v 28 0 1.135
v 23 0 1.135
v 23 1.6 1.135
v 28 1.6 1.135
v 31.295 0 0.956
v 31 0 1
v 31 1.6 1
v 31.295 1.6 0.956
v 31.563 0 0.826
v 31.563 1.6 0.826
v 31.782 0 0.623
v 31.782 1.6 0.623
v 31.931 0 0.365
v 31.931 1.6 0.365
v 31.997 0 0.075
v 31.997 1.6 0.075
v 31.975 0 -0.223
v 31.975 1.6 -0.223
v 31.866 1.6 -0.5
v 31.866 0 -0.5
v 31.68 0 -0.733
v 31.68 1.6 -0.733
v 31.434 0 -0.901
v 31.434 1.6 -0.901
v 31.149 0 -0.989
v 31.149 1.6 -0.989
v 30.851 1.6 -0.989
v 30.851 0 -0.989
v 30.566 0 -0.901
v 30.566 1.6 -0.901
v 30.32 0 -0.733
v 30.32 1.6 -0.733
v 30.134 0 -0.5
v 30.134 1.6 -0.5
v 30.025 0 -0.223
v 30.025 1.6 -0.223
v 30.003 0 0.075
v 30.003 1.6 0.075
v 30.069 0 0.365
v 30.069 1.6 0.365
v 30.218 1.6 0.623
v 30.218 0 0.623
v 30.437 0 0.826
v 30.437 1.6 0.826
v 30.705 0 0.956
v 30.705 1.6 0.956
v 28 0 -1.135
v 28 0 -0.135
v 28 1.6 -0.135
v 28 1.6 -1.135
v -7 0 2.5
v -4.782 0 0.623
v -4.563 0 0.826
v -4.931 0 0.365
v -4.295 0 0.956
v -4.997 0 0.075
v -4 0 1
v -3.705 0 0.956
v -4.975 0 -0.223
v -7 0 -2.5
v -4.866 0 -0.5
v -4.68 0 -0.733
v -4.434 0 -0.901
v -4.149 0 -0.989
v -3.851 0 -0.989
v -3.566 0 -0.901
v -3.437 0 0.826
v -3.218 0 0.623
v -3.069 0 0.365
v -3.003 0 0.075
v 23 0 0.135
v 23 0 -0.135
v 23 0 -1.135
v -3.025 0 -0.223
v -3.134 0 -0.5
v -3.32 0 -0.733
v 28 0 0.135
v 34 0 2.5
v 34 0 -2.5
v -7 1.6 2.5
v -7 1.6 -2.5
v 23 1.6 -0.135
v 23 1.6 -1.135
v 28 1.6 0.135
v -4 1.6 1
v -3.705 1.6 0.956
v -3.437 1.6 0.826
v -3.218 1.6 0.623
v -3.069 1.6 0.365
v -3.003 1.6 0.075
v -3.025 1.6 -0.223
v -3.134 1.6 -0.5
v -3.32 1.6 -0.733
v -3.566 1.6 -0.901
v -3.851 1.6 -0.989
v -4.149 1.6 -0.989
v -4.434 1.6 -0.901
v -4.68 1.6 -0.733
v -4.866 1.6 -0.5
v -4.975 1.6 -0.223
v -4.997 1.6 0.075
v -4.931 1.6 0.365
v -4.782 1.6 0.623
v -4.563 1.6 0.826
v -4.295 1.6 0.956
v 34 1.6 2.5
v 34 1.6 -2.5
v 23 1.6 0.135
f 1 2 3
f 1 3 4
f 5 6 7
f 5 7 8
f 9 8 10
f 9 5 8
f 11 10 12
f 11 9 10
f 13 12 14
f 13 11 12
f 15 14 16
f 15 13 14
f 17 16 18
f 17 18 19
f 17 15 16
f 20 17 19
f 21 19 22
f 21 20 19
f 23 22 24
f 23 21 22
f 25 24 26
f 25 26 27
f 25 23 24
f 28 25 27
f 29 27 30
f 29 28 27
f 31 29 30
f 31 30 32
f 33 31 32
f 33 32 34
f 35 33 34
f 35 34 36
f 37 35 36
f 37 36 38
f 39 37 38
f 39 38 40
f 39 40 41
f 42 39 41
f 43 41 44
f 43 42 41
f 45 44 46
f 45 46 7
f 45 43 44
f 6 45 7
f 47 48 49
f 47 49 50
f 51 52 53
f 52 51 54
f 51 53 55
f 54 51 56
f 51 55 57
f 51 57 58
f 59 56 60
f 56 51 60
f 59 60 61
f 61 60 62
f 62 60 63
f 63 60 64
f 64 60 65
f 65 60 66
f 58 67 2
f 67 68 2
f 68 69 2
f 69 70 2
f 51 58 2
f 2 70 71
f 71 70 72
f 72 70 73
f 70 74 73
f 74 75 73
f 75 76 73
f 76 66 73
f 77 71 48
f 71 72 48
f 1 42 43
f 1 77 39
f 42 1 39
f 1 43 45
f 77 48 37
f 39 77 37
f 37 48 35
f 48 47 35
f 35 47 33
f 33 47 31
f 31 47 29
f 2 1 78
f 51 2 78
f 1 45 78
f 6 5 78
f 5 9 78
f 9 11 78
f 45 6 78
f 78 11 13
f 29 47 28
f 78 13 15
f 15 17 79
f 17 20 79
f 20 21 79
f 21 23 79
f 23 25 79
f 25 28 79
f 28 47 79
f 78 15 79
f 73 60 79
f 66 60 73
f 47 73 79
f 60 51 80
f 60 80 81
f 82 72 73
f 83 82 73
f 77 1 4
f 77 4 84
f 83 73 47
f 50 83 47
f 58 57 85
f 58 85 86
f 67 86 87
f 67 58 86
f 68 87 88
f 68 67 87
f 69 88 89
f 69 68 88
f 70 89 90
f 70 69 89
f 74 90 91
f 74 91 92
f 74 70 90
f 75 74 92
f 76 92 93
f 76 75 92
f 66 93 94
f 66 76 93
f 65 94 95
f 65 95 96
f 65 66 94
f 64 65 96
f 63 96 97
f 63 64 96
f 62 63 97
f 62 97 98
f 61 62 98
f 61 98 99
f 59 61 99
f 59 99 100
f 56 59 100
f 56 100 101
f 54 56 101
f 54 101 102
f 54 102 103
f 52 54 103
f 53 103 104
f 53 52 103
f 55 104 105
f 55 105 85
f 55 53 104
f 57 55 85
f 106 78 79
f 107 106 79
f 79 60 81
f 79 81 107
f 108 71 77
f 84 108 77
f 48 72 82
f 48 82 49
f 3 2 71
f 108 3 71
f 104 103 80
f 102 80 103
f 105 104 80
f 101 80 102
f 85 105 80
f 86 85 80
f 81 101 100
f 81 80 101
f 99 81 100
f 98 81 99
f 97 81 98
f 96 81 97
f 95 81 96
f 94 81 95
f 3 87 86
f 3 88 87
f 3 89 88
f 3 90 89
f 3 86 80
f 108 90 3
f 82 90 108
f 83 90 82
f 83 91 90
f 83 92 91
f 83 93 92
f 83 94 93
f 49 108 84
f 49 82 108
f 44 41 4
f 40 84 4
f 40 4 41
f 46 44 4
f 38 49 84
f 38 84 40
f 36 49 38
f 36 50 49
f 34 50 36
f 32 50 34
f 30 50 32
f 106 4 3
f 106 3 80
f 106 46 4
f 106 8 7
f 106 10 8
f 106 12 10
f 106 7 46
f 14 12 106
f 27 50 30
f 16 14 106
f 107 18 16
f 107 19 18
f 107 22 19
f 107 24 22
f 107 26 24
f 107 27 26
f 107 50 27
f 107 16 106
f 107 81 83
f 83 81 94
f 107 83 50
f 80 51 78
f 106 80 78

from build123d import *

# Parameters (mm, degrees)
SKETCH1_W           = 41
SKETCH1_H           = 5
SKETCH1_W_2         = 5
SKETCH1_H_2         = 1
SKETCH1_R           = 1
BOSS_EXTRUDE1_DEPTH = 1.6


with BuildPart() as part:
    # Sketch1 → Boss-Extrude1 (new body)
    with BuildSketch(Plane(origin=(0, 0, 0), x_dir=(1, 0, 0), z_dir=(0, 1, 0))):
        with Locations((13.5, 0)):
            Rectangle(SKETCH1_W, SKETCH1_H)
        with Locations((25.5, -0.635)):
            Rectangle(SKETCH1_W_2, SKETCH1_H_2, mode=Mode.SUBTRACT)
        with Locations(Location((-4, 0, 0), (0, 0, 270))):
            Circle(SKETCH1_R, mode=Mode.SUBTRACT)
        with Locations(Location((31, 0, 0), (0, 0, 270))):
            Circle(SKETCH1_R, mode=Mode.SUBTRACT)
        with Locations((25.5, 0.635)):
            Rectangle(SKETCH1_W_2, SKETCH1_H_2, mode=Mode.SUBTRACT)
    extrude(amount=BOSS_EXTRUDE1_DEPTH)


solid = part.part
